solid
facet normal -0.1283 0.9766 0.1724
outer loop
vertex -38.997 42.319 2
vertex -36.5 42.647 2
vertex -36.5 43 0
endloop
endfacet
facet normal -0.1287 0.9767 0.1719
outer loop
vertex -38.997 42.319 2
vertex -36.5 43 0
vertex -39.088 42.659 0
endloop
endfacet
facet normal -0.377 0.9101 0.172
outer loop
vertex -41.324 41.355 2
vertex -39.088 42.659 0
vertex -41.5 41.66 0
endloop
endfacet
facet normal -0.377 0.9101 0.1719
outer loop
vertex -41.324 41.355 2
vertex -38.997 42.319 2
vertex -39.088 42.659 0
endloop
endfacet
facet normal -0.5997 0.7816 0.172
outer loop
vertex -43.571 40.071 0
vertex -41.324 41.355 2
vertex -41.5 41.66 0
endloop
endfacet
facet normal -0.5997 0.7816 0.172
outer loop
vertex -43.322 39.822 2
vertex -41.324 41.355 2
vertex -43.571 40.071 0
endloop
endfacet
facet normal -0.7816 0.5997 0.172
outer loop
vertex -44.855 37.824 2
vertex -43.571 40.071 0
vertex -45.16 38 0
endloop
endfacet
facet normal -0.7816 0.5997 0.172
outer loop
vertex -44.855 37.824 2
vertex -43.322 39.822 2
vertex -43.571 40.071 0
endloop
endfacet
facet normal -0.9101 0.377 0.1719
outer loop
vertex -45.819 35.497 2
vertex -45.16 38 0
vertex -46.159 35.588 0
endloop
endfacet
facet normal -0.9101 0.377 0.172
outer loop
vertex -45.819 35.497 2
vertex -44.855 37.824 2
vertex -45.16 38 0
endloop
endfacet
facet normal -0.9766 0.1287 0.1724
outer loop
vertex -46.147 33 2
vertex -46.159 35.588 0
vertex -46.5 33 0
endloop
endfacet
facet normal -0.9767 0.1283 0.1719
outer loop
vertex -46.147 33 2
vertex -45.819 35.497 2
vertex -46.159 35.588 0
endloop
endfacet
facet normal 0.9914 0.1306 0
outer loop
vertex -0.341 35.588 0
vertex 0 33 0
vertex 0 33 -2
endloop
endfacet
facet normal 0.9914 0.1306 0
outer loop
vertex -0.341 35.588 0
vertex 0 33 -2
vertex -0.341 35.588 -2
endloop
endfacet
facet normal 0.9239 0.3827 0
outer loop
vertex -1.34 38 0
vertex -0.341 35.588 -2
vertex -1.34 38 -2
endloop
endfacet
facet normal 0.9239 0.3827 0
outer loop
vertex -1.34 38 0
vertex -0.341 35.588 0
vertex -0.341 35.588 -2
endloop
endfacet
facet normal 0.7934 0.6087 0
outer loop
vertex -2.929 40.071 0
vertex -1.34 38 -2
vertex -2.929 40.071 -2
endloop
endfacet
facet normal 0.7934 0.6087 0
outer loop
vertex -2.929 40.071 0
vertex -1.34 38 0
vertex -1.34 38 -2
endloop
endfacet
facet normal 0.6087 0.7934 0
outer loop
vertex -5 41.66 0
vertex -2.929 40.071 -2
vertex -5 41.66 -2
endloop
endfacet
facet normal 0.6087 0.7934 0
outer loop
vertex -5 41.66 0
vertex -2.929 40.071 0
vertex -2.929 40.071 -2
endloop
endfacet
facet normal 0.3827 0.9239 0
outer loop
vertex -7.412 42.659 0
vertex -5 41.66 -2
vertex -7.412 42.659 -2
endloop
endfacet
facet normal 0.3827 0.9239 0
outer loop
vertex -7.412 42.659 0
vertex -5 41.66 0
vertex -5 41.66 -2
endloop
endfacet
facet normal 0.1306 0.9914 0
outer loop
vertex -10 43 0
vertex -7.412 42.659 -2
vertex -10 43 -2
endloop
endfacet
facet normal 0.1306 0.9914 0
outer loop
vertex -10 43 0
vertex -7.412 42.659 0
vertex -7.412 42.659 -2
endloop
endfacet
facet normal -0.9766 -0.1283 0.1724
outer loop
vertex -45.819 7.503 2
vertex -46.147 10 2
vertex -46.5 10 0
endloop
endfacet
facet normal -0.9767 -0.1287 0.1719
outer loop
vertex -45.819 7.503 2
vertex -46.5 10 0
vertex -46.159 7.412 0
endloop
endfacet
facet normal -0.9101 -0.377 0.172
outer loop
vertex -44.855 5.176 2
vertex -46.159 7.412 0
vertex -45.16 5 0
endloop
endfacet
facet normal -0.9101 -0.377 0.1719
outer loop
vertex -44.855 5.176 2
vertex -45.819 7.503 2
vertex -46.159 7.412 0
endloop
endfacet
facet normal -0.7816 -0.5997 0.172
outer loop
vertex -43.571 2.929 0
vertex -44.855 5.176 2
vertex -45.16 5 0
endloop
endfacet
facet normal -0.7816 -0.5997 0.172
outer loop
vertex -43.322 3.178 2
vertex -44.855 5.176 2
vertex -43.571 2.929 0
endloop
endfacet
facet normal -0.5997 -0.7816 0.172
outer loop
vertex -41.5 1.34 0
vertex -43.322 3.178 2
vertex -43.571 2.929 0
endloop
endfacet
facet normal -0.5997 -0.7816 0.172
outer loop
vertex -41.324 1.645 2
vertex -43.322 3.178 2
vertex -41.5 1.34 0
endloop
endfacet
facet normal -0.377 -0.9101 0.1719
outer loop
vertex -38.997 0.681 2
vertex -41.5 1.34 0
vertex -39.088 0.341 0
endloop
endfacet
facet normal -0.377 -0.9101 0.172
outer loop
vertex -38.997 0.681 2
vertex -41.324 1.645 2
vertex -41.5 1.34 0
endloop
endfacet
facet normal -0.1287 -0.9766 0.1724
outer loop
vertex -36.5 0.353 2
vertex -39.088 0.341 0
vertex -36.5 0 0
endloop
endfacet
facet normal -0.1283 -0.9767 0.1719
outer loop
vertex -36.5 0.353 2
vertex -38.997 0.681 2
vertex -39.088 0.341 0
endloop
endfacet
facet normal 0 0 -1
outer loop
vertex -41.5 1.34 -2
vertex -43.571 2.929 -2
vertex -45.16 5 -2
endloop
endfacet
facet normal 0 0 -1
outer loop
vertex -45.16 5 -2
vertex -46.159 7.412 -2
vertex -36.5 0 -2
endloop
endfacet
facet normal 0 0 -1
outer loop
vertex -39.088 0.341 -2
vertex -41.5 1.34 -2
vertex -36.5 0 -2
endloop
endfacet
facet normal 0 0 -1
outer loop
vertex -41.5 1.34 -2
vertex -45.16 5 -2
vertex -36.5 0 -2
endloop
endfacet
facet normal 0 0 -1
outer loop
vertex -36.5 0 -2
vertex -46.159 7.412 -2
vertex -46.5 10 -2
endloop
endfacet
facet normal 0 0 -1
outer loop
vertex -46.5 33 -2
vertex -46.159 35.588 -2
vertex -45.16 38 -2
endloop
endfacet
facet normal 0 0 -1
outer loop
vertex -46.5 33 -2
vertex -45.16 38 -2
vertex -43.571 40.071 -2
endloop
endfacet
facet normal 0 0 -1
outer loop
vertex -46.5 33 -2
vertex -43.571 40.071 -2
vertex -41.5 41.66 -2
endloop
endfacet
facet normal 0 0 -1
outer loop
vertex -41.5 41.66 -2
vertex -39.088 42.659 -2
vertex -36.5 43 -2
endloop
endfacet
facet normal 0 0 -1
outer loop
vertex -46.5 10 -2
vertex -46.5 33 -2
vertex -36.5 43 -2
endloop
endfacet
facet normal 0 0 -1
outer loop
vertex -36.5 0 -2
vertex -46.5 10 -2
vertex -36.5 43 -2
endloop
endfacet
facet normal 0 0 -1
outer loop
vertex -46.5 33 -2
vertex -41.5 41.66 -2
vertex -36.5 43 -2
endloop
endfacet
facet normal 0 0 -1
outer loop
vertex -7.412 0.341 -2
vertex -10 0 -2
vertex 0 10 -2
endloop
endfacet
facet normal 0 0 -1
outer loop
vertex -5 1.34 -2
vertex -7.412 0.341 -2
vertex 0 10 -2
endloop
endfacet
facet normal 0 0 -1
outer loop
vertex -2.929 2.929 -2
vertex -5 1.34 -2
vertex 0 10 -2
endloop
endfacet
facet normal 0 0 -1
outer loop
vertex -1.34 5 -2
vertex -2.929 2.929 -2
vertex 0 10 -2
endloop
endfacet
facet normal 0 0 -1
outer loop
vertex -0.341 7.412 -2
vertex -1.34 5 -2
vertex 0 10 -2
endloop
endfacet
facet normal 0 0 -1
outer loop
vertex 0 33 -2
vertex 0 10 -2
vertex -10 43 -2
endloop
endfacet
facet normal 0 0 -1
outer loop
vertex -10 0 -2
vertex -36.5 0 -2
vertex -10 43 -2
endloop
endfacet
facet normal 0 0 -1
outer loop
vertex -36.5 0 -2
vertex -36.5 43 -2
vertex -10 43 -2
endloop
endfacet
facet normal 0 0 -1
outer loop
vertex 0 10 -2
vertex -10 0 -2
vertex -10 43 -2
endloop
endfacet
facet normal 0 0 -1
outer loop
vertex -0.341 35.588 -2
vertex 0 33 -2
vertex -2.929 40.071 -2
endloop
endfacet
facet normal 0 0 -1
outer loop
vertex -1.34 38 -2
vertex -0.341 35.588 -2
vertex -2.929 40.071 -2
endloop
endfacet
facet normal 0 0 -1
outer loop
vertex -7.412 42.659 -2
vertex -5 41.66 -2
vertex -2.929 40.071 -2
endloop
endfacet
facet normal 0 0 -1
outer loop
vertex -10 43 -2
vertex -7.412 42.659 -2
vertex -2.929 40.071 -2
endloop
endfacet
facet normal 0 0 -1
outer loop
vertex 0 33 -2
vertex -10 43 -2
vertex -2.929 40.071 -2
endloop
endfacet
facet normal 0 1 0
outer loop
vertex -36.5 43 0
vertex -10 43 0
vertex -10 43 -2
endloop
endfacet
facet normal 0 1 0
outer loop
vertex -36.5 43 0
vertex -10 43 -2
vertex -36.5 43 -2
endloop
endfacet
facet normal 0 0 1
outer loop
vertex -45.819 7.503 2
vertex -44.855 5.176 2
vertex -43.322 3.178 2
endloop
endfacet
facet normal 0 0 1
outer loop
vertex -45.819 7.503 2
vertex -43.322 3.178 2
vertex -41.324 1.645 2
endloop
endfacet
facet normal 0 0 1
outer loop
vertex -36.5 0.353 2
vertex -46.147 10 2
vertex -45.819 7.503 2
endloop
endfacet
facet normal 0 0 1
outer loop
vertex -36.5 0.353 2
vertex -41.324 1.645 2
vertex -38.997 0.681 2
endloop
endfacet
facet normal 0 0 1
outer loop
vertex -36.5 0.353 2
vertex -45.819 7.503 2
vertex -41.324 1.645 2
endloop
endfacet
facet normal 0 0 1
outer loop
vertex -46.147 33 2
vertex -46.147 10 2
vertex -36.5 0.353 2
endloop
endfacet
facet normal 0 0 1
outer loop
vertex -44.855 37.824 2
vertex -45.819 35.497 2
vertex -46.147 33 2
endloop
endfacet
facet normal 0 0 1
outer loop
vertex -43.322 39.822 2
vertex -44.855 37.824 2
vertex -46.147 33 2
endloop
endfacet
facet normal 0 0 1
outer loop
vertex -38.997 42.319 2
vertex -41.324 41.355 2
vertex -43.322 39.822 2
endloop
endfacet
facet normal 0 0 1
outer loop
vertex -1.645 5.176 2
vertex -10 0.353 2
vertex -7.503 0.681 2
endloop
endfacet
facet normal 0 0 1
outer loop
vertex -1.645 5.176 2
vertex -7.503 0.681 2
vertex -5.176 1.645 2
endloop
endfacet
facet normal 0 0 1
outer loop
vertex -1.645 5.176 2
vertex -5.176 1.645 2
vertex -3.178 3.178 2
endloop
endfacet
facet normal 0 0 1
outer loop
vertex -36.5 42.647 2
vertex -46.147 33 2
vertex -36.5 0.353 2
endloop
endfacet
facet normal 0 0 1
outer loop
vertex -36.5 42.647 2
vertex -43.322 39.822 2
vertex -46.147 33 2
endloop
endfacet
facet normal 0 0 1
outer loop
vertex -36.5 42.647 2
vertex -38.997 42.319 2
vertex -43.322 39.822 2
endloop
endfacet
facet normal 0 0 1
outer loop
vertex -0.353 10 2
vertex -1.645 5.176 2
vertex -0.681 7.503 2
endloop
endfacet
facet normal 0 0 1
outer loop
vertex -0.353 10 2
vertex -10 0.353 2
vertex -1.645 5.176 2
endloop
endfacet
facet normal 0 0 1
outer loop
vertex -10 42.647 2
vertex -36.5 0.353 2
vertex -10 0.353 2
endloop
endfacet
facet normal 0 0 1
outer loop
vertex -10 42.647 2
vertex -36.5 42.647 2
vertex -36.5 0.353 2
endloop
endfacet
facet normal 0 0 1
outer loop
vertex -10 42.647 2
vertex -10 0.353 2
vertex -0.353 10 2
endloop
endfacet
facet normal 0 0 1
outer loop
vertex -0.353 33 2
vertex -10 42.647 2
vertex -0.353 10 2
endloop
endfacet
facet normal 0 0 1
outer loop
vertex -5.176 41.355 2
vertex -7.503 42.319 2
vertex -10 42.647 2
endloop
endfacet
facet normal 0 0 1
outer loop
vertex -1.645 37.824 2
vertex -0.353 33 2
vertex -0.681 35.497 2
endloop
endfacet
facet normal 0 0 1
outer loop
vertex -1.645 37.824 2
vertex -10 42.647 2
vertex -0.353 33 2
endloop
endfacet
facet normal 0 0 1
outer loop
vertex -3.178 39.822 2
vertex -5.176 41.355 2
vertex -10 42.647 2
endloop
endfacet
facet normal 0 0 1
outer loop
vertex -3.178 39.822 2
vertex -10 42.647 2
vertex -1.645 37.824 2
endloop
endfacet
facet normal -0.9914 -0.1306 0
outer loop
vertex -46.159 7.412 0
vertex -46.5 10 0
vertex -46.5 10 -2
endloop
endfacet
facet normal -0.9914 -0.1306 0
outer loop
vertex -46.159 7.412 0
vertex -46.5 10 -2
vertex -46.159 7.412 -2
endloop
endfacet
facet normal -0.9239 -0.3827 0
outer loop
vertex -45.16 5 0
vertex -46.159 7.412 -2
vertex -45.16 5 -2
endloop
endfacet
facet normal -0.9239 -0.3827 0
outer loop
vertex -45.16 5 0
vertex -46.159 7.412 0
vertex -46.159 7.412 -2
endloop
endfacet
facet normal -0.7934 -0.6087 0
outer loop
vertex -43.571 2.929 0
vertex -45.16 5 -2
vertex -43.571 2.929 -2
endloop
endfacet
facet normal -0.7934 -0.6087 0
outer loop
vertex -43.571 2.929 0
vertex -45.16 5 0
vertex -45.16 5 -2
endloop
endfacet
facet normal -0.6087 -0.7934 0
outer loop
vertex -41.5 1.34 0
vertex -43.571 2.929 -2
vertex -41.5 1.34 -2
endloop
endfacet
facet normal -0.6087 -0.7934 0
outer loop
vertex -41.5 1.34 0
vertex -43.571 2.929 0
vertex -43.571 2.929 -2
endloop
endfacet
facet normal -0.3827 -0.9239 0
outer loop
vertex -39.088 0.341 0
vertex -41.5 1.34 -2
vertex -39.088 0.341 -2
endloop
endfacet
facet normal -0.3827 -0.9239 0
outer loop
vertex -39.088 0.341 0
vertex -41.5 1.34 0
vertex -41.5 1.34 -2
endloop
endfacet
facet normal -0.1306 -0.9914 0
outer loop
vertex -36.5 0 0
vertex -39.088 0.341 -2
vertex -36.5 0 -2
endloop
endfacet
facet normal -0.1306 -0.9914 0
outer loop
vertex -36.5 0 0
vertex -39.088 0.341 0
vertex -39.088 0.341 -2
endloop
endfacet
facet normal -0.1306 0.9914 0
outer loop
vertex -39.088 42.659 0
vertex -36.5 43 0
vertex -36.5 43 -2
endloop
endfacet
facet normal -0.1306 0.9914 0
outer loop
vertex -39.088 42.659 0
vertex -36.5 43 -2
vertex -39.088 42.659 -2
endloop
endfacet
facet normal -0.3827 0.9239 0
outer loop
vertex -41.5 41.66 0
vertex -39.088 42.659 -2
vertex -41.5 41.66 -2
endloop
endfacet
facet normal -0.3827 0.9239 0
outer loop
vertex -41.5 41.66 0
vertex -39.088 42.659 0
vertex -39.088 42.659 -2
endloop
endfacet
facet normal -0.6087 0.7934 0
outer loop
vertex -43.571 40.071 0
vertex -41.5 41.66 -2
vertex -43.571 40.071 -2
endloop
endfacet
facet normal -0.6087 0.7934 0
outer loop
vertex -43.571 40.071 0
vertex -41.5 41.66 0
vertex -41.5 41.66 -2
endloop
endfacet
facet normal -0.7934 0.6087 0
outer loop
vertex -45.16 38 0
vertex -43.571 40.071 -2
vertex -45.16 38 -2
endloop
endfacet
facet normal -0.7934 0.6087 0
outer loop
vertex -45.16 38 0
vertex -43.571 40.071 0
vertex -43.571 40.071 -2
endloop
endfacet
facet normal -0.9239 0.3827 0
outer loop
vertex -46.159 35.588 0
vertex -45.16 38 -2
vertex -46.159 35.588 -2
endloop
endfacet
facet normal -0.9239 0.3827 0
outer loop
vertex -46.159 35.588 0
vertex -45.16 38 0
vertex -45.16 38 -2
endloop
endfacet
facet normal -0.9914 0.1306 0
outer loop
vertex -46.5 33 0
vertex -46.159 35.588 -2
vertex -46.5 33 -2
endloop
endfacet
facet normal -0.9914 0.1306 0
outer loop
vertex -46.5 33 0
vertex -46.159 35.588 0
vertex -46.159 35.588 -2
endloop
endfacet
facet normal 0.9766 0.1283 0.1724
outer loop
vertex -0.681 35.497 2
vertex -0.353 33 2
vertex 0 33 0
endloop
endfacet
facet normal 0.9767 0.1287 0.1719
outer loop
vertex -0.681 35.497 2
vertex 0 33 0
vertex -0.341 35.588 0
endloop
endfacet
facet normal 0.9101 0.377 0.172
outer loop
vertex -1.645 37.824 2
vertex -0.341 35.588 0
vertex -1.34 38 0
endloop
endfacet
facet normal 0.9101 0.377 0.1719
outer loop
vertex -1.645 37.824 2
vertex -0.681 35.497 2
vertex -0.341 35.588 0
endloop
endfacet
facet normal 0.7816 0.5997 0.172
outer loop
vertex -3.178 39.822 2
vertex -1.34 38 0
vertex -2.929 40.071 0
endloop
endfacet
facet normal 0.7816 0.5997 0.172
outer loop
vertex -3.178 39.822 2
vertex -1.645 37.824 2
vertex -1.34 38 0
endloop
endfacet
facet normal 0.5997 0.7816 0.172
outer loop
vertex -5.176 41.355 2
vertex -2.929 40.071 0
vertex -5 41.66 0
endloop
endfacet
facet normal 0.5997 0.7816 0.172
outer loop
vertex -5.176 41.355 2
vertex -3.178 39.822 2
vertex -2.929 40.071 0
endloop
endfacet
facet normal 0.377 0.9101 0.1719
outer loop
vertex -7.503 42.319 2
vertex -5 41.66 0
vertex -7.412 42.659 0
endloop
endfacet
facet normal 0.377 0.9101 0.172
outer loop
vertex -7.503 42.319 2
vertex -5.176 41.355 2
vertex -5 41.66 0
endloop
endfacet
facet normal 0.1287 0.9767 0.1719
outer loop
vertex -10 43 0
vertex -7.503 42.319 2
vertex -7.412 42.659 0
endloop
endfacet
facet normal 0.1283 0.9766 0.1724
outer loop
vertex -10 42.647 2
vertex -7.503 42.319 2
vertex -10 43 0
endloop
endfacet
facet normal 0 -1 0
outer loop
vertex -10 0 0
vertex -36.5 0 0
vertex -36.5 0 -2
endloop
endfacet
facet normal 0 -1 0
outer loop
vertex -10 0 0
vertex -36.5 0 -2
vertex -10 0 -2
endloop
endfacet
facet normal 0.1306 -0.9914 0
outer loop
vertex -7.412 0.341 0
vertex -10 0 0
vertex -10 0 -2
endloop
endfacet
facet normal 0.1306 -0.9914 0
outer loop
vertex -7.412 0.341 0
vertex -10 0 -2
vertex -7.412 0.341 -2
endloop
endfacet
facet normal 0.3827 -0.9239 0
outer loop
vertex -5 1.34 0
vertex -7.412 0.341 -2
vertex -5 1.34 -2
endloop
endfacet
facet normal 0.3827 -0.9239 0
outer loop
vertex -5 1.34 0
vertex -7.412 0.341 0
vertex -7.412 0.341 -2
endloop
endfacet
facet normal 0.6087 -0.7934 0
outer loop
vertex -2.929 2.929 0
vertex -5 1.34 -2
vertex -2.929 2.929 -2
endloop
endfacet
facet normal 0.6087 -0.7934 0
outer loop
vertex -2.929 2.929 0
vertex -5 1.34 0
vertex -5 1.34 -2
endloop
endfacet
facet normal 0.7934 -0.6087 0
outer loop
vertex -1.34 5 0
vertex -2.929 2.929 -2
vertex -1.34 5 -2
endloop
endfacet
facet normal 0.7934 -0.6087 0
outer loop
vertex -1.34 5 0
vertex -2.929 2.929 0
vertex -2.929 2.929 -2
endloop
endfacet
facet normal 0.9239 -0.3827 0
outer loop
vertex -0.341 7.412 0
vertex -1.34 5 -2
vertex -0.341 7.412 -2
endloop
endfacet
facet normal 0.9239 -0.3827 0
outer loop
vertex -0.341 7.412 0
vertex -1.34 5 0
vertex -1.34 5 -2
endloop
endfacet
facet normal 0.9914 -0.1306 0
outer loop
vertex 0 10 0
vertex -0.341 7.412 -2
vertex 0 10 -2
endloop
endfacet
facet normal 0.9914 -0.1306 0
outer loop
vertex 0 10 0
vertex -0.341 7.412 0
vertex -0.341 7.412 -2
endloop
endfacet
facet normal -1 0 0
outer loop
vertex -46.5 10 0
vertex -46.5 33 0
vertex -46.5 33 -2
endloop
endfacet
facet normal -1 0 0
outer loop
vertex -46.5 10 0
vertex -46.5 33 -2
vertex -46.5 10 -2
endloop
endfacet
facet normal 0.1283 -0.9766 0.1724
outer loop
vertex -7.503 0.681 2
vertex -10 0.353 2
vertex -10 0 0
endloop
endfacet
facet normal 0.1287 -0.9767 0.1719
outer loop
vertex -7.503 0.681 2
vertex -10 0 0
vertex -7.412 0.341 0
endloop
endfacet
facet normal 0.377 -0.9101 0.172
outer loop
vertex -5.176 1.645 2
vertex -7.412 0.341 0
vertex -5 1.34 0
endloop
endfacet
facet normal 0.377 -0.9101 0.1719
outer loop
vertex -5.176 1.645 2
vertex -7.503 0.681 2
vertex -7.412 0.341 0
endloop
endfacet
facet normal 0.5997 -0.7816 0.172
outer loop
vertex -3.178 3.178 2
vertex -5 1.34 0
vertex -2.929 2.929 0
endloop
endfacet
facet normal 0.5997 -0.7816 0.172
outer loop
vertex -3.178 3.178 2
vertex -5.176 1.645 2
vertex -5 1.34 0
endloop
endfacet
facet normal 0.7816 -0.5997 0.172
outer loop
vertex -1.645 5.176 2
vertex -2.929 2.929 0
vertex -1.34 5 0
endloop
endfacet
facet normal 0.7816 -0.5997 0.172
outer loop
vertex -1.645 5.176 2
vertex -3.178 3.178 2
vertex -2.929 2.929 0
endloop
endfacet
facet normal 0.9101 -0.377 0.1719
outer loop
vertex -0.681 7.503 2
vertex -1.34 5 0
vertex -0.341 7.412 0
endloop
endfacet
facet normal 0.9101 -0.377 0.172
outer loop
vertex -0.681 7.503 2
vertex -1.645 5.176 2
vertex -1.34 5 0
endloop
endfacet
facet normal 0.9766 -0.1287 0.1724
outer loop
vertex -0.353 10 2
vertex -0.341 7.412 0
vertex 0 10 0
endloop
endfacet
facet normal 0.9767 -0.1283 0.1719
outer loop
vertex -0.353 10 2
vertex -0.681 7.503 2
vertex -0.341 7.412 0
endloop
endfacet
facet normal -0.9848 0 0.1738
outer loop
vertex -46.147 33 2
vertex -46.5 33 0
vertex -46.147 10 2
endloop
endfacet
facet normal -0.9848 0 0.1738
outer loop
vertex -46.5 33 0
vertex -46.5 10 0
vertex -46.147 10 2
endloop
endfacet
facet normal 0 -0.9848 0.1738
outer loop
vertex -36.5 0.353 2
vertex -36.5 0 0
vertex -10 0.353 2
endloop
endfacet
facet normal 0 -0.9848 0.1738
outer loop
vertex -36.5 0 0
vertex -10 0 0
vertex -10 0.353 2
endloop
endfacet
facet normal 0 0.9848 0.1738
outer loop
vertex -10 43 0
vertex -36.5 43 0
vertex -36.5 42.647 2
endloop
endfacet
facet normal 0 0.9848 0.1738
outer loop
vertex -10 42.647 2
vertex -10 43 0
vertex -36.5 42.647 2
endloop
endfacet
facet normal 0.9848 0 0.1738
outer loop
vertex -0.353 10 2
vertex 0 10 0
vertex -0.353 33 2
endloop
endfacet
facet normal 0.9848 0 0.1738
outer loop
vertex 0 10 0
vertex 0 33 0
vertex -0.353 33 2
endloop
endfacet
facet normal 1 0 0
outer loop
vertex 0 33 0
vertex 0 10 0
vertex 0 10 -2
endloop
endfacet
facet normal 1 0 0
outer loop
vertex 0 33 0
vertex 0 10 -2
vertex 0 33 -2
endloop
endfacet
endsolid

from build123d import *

# Parameters (mm, degrees)
RESSALTO_EXTRUS_O2_DEPTH           = 2
RESSALTO_EXTRUS_O2_OTHER_WAY_DEPTH = 2
RESSALTO_EXTRUS_O2_OTHER_WAY_TAPER = 10


with BuildPart() as part:
    # Esboço6 → Ressalto-extrusão2 (new body)
    with BuildSketch(Plane.XY):
        with BuildLine():
            ThreePointArc((-10, 0), (-2.928932188, 2.928932188), (0, 10))
            Line((0, 10), (0, 33))
            ThreePointArc((0, 33), (-2.928932188, 40.071067812), (-10, 43))
            Line((-10, 43), (-36.5, 43))
            ThreePointArc((-36.5, 43), (-43.571067812, 40.071067812), (-46.5, 33))
            Line((-46.5, 33), (-46.5, 10))
            ThreePointArc((-46.5, 10), (-43.571067812, 2.928932188), (-36.5, 0))
            Line((-36.5, 0), (-10, 0))
        make_face()
    extrude(amount=-RESSALTO_EXTRUS_O2_DEPTH)

    # Esboço6 → Ressalto-extrusão2 other way (add)
    with BuildSketch(Plane.XY):
        with BuildLine():
            ThreePointArc((-10, 0), (-2.928932188, 2.928932188), (0, 10))
            Line((0, 10), (0, 33))
            ThreePointArc((0, 33), (-2.928932188, 40.071067812), (-10, 43))
            Line((-10, 43), (-36.5, 43))
            ThreePointArc((-36.5, 43), (-43.571067812, 40.071067812), (-46.5, 33))
            Line((-46.5, 33), (-46.5, 10))
            ThreePointArc((-46.5, 10), (-43.571067812, 2.928932188), (-36.5, 0))
            Line((-36.5, 0), (-10, 0))
        make_face()
    extrude(amount=RESSALTO_EXTRUS_O2_OTHER_WAY_DEPTH, taper=RESSALTO_EXTRUS_O2_OTHER_WAY_TAPER)


solid = part.part
